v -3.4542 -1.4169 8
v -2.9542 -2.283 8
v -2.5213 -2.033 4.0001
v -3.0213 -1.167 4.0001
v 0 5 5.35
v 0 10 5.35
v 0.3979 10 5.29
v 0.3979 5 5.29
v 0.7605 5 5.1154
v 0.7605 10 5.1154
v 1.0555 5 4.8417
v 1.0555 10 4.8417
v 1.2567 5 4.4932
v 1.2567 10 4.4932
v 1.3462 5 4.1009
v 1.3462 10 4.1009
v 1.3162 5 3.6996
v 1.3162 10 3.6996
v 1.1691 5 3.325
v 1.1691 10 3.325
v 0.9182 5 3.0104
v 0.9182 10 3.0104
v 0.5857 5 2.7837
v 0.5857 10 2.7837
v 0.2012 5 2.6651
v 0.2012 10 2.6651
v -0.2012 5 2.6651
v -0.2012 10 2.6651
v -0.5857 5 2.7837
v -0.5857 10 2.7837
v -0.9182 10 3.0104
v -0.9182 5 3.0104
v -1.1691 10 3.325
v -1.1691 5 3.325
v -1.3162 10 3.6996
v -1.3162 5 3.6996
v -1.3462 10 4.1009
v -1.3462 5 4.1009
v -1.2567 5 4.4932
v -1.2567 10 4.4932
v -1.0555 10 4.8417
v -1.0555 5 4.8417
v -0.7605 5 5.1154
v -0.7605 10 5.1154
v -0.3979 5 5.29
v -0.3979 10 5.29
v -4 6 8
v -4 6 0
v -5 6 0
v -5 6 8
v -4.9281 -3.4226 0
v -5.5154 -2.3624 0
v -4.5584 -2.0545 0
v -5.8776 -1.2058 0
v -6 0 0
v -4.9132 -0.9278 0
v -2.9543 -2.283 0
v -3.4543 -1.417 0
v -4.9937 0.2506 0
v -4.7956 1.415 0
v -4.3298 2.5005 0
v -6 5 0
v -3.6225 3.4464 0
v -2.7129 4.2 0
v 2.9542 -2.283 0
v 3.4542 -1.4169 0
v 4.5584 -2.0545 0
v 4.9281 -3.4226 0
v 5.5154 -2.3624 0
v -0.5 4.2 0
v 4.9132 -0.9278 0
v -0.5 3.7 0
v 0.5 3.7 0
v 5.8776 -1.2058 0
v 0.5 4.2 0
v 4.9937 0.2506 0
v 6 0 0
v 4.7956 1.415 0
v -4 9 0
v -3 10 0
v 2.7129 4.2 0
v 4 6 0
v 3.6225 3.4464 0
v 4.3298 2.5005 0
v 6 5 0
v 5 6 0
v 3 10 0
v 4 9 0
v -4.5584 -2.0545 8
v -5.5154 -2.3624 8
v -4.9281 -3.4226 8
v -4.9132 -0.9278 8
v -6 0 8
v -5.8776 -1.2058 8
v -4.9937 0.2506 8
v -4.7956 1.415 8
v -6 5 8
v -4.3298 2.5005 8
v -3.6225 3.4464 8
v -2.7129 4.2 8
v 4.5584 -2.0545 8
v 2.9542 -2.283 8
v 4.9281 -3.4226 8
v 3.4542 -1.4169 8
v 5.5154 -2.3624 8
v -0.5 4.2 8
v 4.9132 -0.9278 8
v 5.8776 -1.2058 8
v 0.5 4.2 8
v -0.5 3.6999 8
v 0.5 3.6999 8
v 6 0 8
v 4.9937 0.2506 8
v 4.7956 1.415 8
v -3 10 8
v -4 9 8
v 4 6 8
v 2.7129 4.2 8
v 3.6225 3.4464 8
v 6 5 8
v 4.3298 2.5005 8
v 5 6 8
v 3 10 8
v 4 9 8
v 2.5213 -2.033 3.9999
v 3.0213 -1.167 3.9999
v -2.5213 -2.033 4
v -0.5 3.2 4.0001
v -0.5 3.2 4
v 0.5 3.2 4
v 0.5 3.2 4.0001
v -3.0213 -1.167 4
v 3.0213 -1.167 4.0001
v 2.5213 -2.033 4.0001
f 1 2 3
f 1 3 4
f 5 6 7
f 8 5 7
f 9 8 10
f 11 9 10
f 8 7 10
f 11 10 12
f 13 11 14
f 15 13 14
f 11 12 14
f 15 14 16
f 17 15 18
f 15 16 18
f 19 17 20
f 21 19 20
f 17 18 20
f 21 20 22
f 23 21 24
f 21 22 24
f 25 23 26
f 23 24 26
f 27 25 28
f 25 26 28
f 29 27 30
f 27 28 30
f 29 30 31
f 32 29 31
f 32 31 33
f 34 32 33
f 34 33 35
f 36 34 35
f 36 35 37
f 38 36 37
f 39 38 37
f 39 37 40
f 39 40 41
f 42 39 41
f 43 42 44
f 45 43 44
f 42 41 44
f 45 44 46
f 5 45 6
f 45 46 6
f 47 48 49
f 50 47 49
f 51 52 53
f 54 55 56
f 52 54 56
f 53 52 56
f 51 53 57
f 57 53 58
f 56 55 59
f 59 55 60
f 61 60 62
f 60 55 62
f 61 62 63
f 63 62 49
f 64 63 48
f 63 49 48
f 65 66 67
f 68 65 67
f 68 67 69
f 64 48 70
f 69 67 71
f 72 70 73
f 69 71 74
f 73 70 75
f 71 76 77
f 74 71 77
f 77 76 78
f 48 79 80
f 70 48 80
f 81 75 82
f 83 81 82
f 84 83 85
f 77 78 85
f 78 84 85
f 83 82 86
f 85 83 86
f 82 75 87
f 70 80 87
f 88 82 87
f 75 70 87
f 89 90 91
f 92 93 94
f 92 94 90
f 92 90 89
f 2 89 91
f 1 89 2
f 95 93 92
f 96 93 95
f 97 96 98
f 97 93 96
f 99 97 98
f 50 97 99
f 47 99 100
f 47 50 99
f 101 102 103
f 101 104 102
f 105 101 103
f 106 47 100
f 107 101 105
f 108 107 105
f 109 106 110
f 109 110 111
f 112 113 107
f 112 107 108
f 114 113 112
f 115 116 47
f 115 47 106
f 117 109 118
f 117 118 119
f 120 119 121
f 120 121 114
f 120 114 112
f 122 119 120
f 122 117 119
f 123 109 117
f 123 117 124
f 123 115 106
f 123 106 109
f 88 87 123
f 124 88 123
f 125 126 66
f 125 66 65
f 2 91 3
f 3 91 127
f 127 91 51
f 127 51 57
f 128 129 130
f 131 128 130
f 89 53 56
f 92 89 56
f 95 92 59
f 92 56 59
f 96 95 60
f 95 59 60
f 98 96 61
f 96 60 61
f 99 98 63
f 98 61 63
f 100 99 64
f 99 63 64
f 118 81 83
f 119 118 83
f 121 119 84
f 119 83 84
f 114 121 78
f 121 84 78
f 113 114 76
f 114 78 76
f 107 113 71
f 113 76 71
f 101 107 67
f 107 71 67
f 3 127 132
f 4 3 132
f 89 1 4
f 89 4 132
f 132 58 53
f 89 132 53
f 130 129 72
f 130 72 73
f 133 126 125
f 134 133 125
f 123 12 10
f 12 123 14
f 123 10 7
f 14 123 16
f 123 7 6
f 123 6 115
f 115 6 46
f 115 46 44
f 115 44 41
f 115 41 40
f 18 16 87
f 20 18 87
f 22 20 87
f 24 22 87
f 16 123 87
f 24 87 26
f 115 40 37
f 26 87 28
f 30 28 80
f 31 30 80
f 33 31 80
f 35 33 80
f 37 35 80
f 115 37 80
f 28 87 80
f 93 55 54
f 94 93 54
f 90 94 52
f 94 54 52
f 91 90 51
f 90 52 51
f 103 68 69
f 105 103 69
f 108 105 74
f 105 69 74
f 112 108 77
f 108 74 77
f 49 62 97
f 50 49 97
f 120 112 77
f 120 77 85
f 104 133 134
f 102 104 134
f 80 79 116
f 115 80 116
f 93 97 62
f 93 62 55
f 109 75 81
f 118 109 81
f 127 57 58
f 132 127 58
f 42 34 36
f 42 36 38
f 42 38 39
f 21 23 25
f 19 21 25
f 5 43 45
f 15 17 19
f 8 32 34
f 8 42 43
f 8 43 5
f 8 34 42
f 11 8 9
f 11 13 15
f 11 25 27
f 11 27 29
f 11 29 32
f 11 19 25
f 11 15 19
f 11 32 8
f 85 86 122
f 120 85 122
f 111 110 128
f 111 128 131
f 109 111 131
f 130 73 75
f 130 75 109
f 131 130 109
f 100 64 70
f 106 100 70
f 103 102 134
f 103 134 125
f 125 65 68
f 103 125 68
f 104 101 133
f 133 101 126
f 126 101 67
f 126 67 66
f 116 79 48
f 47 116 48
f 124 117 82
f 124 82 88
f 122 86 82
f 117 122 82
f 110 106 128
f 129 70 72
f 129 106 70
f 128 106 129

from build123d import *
from OCP.BRepFilletAPI import BRepFilletAPI_MakeChamfer

# Parameters (mm, degrees)
BOSS_EXTRUDE2_DEPTH = 8
SKETCH11_R          = 1.35
CUT_EXTRUDE5_DEPTH  = 5
CHAMFER1_SIZE       = 1
CHAMFER2_SIZE       = 4
CHAMFER2_SIZE_2     = 0.5
CHAMFER3_SIZE       = 0.5
CHAMFER3_SIZE2      = 4


with BuildPart() as part:
    # Sketch1 → Boss-Extrude2 (new body)
    with BuildSketch(Plane.XY):
        with BuildLine():
            Line((-2.712931993, 4.2), (-0.5, 4.2))
            Line((-0.5, 4.2), (-0.5, 3.2))
            Line((-0.5, 3.2), (0.5, 3.2))
            Line((0.5, 3.2), (0.5, 4.2))
            Line((0.5, 4.2), (2.712931993, 4.2))
            ThreePointArc((2.712931993, 4.2), (4.795591913, 1.415025868), (4.558421985, -2.054455891))
            Line((4.558421985, -2.054455891), (3.021281292, -1.166987298))
            Line((3.021281292, -1.166987298), (2.521281292, -2.033012702))
            Line((2.521281292, -2.033012702), (4.928078794, -3.422577888))
            ThreePointArc((4.928078794, -3.422577888), (5.725752036, -1.793255034), (6, 0))
            Line((6, 0), (6, 6))
            Line((6, 6), (4, 6))
            Line((4, 6), (4, 10))
            Line((4, 10), (-4, 10))
            Line((-4, 10), (-4, 6))
            Line((-4, 6), (-6, 6))
            Line((-6, 6), (-6, 0))
            ThreePointArc((-6, 0), (-5.725752036, -1.793255034), (-4.928078794, -3.422577888))
            Line((-4.928078794, -3.422577888), (-2.521281292, -2.033012702))
            Line((-2.521281292, -2.033012702), (-3.021281292, -1.166987298))
            Line((-3.021281292, -1.166987298), (-4.558421985, -2.054455891))
            ThreePointArc((-4.558421985, -2.054455891), (-4.795591913, 1.415025868), (-2.712931993, 4.2))
        make_face()
    extrude(amount=BOSS_EXTRUDE2_DEPTH)

    # Sketch11 → Cut-Extrude5 (cut)
    with BuildSketch(Plane(origin=(0, 10, 0), x_dir=(1, 0, 0), z_dir=(0, 1, 0))):
        with Locations(Location((0, -4, 0), (0, 0, 270))):
            Circle(SKETCH11_R)
    extrude(amount=-CUT_EXTRUDE5_DEPTH, mode=Mode.SUBTRACT)

    # Chamfer1
    chamfer1_edges = [part.edges().sort_by_distance(p)[0] for p in [
        (-6, 6, 4),
        (-4, 10, 4),
        (4, 10, 4),
        (6, 6, 4),
    ]]
    chamfer(chamfer1_edges, length=CHAMFER1_SIZE)

    # Chamfer2
    chamfer2_edges_1 = [part.edges().sort_by_distance(p)[0] for p in [
        (2.771281292, -1.6, 8),
    ]]
    chamfer2_side_1 = [part.faces().sort_by_distance(p)[0] for p in [
        (2.771281292, -1.6, 7.99),
    ]]
    chamfer2_edges_2 = [part.edges().sort_by_distance(p)[0] for p in [
        (2.771281292, -1.6, 0),
    ]]
    chamfer2_side_2 = [part.faces().sort_by_distance(p)[0] for p in [
        (2.779941546, -1.605, 0),
    ]]
    chamfer2_edges_3 = [part.edges().sort_by_distance(p)[0] for p in [
        (0, 3.2, 8),
    ]]
    chamfer2_side_3 = [part.faces().sort_by_distance(p)[0] for p in [
        (0, 3.2, 7.99),
    ]]
    chamfer2_edges_4 = [part.edges().sort_by_distance(p)[0] for p in [
        (-2.771281292, -1.6, 8),
    ]]
    chamfer2_side_4 = [part.faces().sort_by_distance(p)[0] for p in [
        (-2.771281292, -1.6, 7.99),
    ]]
    chamfer2 = BRepFilletAPI_MakeChamfer(part.part.solid().wrapped)
    for e in chamfer2_edges_1:
        chamfer2.Add(CHAMFER2_SIZE - 0.0001, CHAMFER2_SIZE_2 - 0.0001, e.wrapped, chamfer2_side_1[0].wrapped)
    for e in chamfer2_edges_2:
        chamfer2.Add(CHAMFER2_SIZE_2 - 0.0001, CHAMFER2_SIZE - 0.0001, e.wrapped, chamfer2_side_2[0].wrapped)
    for e in chamfer2_edges_3:
        chamfer2.Add(CHAMFER2_SIZE - 0.0001, CHAMFER2_SIZE_2 - 0.0001, e.wrapped, chamfer2_side_3[0].wrapped)
    for e in chamfer2_edges_4:
        chamfer2.Add(CHAMFER2_SIZE - 0.0001, CHAMFER2_SIZE_2 - 0.0001, e.wrapped, chamfer2_side_4[0].wrapped)
    add(Compound.cast(chamfer2.Shape()), mode=Mode.REPLACE)  # a hair under: the kernel refuses the full size

    # Chamfer3
    chamfer3_edges = [part.edges().sort_by_distance(p)[0] for p in [
        (-2.771281292, -1.6, 0),
        (0, 3.2, 0),
    ]]
    chamfer3_side = [part.faces().sort_by_distance(p)[0] for p in [
        (-0.019519244, 4.871717055, 0),
    ]]
    chamfer(chamfer3_edges, length=CHAMFER3_SIZE, length2=CHAMFER3_SIZE2, reference=chamfer3_side[0])


solid = part.part
